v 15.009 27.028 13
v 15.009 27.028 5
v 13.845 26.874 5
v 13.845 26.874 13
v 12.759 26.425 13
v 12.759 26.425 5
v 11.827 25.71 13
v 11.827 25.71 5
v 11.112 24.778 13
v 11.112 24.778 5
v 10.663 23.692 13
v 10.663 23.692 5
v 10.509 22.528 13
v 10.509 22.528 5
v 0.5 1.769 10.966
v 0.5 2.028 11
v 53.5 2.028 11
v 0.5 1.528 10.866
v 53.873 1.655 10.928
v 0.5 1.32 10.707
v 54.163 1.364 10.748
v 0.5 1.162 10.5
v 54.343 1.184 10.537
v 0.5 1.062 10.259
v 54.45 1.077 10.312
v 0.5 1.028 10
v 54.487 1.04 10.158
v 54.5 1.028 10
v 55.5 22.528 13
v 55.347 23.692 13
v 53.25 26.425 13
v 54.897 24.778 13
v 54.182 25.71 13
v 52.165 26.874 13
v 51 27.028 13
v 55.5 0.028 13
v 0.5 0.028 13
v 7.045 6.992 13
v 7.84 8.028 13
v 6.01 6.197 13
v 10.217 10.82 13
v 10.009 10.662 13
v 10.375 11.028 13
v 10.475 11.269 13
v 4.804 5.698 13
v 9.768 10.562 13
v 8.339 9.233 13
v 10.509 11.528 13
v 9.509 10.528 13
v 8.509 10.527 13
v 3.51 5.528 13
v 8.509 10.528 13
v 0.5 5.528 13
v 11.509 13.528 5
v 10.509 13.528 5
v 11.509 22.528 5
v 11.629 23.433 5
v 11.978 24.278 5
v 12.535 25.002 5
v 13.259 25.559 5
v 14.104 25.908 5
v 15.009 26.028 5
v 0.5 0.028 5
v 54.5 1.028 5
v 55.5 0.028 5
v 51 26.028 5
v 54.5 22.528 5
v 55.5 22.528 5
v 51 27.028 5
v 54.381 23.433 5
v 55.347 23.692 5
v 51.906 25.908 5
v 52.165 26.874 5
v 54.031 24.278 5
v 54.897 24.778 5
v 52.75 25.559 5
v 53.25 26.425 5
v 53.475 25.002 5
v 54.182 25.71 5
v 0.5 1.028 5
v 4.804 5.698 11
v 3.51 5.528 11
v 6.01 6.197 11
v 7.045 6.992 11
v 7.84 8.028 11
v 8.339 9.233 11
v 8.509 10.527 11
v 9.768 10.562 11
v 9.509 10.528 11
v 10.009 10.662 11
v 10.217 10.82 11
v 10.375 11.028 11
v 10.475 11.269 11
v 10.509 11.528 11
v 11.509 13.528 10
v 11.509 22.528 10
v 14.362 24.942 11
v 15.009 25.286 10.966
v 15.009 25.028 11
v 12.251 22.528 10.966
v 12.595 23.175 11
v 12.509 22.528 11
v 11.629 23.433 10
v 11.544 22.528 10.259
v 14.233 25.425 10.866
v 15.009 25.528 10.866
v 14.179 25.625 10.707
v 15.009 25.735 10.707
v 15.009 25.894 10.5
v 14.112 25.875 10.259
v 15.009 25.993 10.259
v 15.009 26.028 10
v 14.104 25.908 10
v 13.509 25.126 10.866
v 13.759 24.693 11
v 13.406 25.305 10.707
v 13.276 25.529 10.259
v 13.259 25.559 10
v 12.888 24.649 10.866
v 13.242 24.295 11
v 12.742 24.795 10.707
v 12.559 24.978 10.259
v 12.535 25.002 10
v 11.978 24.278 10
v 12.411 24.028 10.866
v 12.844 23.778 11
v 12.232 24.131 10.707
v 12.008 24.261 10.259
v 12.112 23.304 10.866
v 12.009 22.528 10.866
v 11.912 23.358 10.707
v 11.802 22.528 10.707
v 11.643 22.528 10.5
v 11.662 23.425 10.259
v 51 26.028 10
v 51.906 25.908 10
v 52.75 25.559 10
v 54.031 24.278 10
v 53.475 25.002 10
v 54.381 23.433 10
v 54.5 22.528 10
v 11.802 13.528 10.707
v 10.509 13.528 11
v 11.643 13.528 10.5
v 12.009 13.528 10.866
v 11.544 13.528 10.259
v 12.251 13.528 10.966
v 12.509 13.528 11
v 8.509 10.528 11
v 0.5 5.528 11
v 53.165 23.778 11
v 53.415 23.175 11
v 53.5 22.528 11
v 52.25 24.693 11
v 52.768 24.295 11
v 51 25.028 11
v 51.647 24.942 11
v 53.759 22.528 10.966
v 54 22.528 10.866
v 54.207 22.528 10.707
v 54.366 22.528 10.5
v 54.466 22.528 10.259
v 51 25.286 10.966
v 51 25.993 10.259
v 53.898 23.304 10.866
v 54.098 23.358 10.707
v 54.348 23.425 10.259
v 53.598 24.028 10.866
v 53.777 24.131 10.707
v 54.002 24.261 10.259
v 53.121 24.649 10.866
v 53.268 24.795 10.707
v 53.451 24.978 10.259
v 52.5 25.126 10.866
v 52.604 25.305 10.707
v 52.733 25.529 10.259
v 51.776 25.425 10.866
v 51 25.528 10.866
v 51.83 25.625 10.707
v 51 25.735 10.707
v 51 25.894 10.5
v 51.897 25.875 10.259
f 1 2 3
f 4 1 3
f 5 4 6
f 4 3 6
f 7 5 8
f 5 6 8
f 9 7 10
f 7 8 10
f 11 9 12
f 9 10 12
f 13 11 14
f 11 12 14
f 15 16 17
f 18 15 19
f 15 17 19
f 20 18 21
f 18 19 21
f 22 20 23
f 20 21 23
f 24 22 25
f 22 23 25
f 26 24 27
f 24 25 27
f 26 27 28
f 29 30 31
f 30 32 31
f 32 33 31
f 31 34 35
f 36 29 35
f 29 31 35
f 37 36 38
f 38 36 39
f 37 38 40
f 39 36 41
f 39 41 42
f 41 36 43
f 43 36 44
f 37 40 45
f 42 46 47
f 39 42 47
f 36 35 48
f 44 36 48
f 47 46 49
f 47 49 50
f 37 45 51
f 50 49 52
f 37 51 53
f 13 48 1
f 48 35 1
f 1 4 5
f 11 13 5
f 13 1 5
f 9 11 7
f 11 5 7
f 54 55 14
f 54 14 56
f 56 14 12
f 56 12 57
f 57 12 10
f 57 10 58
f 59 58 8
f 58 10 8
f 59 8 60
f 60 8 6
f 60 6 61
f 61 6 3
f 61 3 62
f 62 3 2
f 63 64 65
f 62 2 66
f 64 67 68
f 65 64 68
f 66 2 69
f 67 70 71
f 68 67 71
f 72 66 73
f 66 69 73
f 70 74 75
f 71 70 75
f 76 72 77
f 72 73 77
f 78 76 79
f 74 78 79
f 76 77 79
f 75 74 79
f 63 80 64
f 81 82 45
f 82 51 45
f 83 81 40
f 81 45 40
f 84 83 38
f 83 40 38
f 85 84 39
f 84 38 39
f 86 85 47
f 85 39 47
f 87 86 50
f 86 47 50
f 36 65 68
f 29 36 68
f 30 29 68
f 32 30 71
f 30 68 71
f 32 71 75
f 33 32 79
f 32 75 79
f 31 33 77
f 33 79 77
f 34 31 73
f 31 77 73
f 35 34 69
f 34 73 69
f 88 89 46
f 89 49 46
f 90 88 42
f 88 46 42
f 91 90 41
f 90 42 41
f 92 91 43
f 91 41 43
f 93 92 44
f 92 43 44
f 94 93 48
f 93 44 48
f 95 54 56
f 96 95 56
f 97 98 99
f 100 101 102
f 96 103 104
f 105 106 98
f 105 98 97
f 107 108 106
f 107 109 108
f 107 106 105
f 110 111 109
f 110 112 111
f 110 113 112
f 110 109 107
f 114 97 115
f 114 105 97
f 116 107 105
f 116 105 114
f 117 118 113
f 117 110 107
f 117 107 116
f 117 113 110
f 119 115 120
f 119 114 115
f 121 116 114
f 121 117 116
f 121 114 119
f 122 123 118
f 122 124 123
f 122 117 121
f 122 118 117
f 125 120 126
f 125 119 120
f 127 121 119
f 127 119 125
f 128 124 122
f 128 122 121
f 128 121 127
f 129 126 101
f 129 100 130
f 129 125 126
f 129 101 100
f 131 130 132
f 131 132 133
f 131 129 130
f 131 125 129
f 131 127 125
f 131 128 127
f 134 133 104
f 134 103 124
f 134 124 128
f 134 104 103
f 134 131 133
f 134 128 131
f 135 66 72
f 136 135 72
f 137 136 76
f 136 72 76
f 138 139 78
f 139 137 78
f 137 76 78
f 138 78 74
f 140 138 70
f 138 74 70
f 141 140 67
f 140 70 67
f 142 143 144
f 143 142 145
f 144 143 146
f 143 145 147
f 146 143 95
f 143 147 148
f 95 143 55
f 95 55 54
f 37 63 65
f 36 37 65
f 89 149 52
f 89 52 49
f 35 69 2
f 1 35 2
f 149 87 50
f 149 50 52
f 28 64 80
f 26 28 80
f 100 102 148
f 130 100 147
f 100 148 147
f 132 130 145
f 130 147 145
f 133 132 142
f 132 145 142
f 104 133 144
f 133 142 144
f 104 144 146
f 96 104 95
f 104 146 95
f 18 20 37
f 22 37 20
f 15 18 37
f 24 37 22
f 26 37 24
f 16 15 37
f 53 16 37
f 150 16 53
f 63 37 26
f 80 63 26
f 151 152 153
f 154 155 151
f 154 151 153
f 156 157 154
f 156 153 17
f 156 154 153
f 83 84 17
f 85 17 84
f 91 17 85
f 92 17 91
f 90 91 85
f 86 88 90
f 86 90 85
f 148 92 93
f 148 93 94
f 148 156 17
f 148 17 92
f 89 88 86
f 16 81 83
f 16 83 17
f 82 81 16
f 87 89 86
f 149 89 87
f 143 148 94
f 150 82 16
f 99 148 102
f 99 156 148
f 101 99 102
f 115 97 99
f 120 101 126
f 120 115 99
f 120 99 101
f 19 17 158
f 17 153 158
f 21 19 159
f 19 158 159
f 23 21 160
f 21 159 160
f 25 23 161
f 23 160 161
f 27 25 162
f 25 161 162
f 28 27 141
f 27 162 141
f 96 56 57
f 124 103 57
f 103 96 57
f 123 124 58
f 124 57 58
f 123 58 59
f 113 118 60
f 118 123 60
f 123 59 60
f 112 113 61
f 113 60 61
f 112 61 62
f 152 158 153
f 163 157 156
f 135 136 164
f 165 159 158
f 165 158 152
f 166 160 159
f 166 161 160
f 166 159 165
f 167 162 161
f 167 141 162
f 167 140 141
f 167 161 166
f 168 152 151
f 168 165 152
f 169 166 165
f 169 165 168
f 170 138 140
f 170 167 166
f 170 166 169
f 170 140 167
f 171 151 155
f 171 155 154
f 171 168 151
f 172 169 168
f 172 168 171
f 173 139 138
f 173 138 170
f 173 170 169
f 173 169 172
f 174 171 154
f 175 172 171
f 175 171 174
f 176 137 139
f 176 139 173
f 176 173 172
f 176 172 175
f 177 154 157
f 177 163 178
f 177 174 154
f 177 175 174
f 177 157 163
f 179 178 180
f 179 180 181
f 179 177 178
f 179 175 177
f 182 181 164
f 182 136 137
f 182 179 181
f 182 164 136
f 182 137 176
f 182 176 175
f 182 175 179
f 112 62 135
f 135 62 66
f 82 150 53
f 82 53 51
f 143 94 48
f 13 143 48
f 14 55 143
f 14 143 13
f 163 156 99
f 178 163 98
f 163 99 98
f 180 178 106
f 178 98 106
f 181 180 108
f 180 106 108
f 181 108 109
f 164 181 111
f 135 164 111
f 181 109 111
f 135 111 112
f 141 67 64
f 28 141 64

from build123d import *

# Parameters (mm, degrees)
BOSS_EXTRUDE1_START = 5
BOSS_EXTRUDE1_DEPTH = 8
BOSS_EXTRUDE2_START = -2
BOSS_EXTRUDE2_DEPTH = 2
FILLET1_R           = 5
FILLET2_R           = 1
FILLET3_R           = 1


with BuildPart() as part:
    # Sketch1 → Boss-Extrude1 (new body)
    with BuildSketch(Plane.XY.offset(BOSS_EXTRUDE1_START)):
        with BuildLine():
            Line((11.509451629, 13.52755518), (11.509451629, 22.52755518))
            ThreePointArc((11.509451629, 22.52755518), (12.534577895, 25.002428914), (15.009451629, 26.02755518))
            Line((15.009451629, 26.02755518), (51, 26.02755518))
            ThreePointArc((51, 26.02755518), (53.474873734, 25.002428914), (54.5, 22.52755518))
            Line((54.5, 22.52755518), (54.5, 1.02755518))
            Line((54.5, 1.02755518), (1.5, 1.02755518))
            Line((1.5, 1.02755518), (0.5, 1.02755518))
            Line((0.5, 1.02755518), (0.5, 0.02755518))
            Line((0.5, 0.02755518), (55.5, 0.02755518))
            Line((55.5, 0.02755518), (55.5, 22.52755518))
            ThreePointArc((55.5, 22.52755518), (54.181980515, 25.709535695), (51, 27.02755518))
            Line((51, 27.02755518), (15.009451629, 27.02755518))
            ThreePointArc((15.009451629, 27.02755518), (11.827471114, 25.709535695), (10.509451629, 22.52755518))
            Line((10.509451629, 22.52755518), (10.509451629, 13.52755518))
            Line((10.509451629, 13.52755518), (11.509451629, 13.52755518))
        make_face()
    extrude(amount=BOSS_EXTRUDE1_DEPTH)

    # Sketch2 → Boss-Extrude2 (add)
    with BuildSketch(Plane.XY.offset(13).offset(BOSS_EXTRUDE2_START)):
        with BuildLine():
            Line((0.5, 5.52755518), (8.509451629, 5.52755518))
            Line((8.509451629, 5.52755518), (8.509451629, 10.52755518))
            Line((8.509451629, 10.52755518), (10.509451629, 10.52755518))
            Line((10.509451629, 10.52755518), (10.509451629, 13.52755518))
            Line((10.509451629, 13.52755518), (10.509451629, 22.52755518))
            ThreePointArc((10.509451629, 22.52755518), (11.827471114, 25.709535695), (15.009451629, 27.02755518))
            Line((15.009451629, 27.02755518), (51, 27.02755518))
            ThreePointArc((51, 27.02755518), (54.181980515, 25.709535695), (55.5, 22.52755518))
            Line((55.5, 22.52755518), (55.5, 0.02755518))
            Line((55.5, 0.02755518), (0.5, 0.02755518))
            Line((0.5, 0.02755518), (0.5, 1.02755518))
            Line((0.5, 1.02755518), (0.5, 5.52755518))
        make_face()
    extrude(amount=BOSS_EXTRUDE2_DEPTH)

    # Fillet1
    fillet1_edges = [part.edges().sort_by_distance(p)[0] for p in [
        (8.509451629, 5.52755518, 12),
    ]]
    fillet(fillet1_edges, radius=FILLET1_R - 0.0001)  # a hair under: the kernel refuses the full size

    # Fillet2
    fillet2_edges = [part.edges().sort_by_distance(p)[0] for p in [
        (10.509451629, 10.52755518, 12),
    ]]
    fillet(fillet2_edges, radius=FILLET2_R)

    # Fillet3
    fillet3_edges = [part.edges().sort_by_distance(p)[0] for p in [
        (11.509451629, 18.02755518, 11),
        (54.5, 11.77755518, 11),
        (27.5, 1.02755518, 11),
        (12.534577895, 25.002428914, 11),
        (33.004725815, 26.02755518, 11),
        (53.474873734, 25.002428914, 11),
    ]]
    fillet(fillet3_edges, radius=FILLET3_R)


solid = part.part
